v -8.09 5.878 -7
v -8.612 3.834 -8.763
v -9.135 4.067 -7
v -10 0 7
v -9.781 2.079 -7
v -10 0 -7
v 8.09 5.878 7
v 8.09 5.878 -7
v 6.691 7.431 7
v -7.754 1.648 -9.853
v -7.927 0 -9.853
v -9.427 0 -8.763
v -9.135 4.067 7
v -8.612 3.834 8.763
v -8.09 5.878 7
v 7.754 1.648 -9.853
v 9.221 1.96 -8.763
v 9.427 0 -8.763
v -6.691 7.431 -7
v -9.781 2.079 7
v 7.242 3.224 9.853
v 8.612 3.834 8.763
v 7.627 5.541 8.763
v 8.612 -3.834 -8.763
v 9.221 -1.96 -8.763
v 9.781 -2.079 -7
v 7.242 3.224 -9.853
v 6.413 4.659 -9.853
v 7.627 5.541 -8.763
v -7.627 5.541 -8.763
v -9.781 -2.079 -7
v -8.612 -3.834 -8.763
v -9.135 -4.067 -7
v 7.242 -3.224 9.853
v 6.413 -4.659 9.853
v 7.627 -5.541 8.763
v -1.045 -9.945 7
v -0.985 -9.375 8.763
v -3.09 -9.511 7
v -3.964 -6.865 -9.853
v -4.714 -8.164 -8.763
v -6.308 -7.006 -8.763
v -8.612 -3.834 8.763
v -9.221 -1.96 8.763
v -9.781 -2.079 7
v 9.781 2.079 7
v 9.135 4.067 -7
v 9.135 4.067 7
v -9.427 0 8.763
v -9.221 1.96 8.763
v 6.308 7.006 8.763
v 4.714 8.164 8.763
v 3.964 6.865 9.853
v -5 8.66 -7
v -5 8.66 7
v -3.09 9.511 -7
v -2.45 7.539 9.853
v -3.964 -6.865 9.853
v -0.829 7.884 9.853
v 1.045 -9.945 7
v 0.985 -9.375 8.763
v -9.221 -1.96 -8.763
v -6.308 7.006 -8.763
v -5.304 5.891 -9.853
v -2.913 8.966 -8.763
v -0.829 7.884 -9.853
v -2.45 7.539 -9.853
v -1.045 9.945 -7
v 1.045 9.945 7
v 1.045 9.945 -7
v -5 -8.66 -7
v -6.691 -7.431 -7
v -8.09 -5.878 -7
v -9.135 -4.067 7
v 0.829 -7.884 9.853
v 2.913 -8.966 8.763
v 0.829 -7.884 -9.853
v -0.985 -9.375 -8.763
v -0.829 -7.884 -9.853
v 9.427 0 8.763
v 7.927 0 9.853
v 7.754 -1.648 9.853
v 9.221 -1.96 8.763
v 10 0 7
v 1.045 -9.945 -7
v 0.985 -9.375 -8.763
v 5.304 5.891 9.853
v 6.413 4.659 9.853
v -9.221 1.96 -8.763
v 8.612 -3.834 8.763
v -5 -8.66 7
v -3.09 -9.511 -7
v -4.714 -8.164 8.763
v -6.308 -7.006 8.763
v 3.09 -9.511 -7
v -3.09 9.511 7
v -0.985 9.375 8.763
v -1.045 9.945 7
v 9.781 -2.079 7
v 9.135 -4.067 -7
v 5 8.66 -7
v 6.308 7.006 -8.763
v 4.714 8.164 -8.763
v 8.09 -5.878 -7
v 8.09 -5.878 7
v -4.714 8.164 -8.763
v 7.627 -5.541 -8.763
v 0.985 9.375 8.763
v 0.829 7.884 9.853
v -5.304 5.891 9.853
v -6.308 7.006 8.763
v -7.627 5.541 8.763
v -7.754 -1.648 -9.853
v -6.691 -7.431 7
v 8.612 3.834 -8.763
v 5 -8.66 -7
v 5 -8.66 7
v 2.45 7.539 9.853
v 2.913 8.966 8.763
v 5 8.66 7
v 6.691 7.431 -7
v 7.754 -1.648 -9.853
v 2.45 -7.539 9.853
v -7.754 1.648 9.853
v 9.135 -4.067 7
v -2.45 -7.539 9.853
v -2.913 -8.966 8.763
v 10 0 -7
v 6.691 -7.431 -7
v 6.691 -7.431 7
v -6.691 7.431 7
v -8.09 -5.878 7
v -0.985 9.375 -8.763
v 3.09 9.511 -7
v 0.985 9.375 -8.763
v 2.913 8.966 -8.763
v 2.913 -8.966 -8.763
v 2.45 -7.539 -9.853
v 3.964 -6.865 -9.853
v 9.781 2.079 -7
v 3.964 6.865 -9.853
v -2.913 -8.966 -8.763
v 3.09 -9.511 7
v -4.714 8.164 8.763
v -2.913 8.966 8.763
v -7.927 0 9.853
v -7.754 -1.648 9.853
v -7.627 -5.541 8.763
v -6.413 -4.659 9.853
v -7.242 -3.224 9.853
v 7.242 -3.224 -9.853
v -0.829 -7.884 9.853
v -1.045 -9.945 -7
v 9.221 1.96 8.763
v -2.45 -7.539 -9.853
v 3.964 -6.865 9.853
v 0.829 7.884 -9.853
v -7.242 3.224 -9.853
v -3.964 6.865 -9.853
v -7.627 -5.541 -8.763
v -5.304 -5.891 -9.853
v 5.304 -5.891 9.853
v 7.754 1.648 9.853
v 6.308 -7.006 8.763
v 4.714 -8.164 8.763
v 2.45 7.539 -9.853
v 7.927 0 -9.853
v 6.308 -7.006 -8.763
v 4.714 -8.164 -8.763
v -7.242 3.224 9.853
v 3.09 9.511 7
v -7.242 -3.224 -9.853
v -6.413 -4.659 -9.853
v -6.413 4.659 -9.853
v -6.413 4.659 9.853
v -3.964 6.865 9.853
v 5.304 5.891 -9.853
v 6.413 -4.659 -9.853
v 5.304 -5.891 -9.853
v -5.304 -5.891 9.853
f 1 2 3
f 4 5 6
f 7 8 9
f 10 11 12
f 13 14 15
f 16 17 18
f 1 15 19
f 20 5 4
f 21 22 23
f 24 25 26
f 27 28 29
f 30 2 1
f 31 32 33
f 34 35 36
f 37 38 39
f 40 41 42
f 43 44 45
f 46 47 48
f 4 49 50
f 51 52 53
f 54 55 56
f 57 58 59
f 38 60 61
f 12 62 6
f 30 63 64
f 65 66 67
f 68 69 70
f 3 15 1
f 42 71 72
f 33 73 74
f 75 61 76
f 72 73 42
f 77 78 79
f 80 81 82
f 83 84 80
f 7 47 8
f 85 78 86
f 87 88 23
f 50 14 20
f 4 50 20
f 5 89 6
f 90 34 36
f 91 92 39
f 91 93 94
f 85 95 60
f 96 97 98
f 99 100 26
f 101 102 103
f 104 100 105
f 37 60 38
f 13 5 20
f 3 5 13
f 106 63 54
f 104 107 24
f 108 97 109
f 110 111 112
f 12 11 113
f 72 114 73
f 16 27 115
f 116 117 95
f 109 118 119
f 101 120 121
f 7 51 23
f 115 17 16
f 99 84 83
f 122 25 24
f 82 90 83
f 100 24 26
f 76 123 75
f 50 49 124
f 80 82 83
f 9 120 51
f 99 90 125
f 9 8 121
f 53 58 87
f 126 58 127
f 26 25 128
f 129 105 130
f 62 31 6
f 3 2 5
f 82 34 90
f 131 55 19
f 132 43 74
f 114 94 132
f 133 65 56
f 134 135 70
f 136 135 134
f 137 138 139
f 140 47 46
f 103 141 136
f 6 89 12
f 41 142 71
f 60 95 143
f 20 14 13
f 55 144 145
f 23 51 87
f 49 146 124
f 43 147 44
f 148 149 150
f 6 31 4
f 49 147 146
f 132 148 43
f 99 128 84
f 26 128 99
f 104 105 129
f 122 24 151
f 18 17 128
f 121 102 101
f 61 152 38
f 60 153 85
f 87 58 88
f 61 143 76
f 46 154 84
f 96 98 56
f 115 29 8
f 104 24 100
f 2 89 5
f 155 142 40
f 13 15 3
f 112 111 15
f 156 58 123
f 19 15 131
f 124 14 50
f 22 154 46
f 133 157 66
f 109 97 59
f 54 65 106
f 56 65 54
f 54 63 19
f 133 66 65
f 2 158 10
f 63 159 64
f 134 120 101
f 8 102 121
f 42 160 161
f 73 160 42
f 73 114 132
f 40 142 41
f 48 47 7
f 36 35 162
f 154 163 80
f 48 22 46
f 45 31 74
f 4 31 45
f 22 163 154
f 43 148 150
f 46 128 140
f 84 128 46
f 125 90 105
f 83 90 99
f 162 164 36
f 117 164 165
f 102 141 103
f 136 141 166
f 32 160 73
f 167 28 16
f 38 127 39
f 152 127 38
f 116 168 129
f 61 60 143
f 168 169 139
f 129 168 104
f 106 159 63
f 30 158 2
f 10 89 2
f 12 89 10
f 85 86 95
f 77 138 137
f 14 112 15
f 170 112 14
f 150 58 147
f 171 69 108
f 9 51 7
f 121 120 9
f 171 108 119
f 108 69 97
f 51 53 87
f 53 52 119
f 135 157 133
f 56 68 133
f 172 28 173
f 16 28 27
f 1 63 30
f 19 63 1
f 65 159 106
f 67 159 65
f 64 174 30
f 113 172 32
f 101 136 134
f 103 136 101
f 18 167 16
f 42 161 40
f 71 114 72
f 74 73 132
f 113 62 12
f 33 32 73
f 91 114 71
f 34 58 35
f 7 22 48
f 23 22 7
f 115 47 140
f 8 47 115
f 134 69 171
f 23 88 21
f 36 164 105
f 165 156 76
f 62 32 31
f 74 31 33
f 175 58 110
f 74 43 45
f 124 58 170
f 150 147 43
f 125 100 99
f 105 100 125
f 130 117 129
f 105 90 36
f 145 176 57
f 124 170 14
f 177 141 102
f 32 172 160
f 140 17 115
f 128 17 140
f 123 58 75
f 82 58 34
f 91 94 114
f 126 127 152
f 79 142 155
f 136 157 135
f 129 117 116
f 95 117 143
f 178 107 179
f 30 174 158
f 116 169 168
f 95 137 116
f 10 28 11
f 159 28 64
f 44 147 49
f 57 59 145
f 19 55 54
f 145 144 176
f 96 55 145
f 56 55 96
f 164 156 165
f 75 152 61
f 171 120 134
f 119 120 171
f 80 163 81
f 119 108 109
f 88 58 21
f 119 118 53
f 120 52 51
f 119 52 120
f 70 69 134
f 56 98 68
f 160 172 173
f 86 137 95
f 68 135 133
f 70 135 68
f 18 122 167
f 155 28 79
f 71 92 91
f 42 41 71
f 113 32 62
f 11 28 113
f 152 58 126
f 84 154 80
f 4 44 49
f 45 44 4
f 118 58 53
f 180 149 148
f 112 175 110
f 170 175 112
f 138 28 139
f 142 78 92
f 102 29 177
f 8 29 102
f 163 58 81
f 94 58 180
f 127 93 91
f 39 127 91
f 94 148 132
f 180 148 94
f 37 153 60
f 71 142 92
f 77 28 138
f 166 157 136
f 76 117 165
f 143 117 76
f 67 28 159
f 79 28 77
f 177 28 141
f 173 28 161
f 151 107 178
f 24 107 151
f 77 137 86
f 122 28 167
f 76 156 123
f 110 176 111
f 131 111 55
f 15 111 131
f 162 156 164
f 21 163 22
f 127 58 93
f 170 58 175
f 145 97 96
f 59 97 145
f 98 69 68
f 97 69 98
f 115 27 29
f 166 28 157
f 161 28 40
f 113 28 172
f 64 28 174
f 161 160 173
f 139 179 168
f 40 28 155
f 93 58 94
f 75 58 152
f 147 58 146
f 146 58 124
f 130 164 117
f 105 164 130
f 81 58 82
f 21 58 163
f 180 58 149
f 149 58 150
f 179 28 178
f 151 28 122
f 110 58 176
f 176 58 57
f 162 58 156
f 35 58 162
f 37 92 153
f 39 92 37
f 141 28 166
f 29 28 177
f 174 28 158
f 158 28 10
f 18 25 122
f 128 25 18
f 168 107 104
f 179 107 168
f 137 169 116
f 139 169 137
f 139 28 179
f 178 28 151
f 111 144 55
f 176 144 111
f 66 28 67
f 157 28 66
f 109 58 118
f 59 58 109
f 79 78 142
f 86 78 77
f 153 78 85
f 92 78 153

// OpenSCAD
module cylinderR(h=10,r1=5,r2=7,radius=3,center=false){
	trans_dist = center==true ? [0,0,-h/2] : [0,0,0];
	r=radius;
	translate(trans_dist)
		hull(){
			union(){
				translate([0,0,r])
				rotate_extrude(convexity = 10)
					translate([r1-r, 0, 0])
						circle(r = r);
				translate([0,0,h-r])
				rotate_extrude(convexity = 10)
					translate([r2-r, 0, 0])
						circle(r = r);
			}
		}
}

cylinderR(h=20,r1=10,r2=10,center=true);
